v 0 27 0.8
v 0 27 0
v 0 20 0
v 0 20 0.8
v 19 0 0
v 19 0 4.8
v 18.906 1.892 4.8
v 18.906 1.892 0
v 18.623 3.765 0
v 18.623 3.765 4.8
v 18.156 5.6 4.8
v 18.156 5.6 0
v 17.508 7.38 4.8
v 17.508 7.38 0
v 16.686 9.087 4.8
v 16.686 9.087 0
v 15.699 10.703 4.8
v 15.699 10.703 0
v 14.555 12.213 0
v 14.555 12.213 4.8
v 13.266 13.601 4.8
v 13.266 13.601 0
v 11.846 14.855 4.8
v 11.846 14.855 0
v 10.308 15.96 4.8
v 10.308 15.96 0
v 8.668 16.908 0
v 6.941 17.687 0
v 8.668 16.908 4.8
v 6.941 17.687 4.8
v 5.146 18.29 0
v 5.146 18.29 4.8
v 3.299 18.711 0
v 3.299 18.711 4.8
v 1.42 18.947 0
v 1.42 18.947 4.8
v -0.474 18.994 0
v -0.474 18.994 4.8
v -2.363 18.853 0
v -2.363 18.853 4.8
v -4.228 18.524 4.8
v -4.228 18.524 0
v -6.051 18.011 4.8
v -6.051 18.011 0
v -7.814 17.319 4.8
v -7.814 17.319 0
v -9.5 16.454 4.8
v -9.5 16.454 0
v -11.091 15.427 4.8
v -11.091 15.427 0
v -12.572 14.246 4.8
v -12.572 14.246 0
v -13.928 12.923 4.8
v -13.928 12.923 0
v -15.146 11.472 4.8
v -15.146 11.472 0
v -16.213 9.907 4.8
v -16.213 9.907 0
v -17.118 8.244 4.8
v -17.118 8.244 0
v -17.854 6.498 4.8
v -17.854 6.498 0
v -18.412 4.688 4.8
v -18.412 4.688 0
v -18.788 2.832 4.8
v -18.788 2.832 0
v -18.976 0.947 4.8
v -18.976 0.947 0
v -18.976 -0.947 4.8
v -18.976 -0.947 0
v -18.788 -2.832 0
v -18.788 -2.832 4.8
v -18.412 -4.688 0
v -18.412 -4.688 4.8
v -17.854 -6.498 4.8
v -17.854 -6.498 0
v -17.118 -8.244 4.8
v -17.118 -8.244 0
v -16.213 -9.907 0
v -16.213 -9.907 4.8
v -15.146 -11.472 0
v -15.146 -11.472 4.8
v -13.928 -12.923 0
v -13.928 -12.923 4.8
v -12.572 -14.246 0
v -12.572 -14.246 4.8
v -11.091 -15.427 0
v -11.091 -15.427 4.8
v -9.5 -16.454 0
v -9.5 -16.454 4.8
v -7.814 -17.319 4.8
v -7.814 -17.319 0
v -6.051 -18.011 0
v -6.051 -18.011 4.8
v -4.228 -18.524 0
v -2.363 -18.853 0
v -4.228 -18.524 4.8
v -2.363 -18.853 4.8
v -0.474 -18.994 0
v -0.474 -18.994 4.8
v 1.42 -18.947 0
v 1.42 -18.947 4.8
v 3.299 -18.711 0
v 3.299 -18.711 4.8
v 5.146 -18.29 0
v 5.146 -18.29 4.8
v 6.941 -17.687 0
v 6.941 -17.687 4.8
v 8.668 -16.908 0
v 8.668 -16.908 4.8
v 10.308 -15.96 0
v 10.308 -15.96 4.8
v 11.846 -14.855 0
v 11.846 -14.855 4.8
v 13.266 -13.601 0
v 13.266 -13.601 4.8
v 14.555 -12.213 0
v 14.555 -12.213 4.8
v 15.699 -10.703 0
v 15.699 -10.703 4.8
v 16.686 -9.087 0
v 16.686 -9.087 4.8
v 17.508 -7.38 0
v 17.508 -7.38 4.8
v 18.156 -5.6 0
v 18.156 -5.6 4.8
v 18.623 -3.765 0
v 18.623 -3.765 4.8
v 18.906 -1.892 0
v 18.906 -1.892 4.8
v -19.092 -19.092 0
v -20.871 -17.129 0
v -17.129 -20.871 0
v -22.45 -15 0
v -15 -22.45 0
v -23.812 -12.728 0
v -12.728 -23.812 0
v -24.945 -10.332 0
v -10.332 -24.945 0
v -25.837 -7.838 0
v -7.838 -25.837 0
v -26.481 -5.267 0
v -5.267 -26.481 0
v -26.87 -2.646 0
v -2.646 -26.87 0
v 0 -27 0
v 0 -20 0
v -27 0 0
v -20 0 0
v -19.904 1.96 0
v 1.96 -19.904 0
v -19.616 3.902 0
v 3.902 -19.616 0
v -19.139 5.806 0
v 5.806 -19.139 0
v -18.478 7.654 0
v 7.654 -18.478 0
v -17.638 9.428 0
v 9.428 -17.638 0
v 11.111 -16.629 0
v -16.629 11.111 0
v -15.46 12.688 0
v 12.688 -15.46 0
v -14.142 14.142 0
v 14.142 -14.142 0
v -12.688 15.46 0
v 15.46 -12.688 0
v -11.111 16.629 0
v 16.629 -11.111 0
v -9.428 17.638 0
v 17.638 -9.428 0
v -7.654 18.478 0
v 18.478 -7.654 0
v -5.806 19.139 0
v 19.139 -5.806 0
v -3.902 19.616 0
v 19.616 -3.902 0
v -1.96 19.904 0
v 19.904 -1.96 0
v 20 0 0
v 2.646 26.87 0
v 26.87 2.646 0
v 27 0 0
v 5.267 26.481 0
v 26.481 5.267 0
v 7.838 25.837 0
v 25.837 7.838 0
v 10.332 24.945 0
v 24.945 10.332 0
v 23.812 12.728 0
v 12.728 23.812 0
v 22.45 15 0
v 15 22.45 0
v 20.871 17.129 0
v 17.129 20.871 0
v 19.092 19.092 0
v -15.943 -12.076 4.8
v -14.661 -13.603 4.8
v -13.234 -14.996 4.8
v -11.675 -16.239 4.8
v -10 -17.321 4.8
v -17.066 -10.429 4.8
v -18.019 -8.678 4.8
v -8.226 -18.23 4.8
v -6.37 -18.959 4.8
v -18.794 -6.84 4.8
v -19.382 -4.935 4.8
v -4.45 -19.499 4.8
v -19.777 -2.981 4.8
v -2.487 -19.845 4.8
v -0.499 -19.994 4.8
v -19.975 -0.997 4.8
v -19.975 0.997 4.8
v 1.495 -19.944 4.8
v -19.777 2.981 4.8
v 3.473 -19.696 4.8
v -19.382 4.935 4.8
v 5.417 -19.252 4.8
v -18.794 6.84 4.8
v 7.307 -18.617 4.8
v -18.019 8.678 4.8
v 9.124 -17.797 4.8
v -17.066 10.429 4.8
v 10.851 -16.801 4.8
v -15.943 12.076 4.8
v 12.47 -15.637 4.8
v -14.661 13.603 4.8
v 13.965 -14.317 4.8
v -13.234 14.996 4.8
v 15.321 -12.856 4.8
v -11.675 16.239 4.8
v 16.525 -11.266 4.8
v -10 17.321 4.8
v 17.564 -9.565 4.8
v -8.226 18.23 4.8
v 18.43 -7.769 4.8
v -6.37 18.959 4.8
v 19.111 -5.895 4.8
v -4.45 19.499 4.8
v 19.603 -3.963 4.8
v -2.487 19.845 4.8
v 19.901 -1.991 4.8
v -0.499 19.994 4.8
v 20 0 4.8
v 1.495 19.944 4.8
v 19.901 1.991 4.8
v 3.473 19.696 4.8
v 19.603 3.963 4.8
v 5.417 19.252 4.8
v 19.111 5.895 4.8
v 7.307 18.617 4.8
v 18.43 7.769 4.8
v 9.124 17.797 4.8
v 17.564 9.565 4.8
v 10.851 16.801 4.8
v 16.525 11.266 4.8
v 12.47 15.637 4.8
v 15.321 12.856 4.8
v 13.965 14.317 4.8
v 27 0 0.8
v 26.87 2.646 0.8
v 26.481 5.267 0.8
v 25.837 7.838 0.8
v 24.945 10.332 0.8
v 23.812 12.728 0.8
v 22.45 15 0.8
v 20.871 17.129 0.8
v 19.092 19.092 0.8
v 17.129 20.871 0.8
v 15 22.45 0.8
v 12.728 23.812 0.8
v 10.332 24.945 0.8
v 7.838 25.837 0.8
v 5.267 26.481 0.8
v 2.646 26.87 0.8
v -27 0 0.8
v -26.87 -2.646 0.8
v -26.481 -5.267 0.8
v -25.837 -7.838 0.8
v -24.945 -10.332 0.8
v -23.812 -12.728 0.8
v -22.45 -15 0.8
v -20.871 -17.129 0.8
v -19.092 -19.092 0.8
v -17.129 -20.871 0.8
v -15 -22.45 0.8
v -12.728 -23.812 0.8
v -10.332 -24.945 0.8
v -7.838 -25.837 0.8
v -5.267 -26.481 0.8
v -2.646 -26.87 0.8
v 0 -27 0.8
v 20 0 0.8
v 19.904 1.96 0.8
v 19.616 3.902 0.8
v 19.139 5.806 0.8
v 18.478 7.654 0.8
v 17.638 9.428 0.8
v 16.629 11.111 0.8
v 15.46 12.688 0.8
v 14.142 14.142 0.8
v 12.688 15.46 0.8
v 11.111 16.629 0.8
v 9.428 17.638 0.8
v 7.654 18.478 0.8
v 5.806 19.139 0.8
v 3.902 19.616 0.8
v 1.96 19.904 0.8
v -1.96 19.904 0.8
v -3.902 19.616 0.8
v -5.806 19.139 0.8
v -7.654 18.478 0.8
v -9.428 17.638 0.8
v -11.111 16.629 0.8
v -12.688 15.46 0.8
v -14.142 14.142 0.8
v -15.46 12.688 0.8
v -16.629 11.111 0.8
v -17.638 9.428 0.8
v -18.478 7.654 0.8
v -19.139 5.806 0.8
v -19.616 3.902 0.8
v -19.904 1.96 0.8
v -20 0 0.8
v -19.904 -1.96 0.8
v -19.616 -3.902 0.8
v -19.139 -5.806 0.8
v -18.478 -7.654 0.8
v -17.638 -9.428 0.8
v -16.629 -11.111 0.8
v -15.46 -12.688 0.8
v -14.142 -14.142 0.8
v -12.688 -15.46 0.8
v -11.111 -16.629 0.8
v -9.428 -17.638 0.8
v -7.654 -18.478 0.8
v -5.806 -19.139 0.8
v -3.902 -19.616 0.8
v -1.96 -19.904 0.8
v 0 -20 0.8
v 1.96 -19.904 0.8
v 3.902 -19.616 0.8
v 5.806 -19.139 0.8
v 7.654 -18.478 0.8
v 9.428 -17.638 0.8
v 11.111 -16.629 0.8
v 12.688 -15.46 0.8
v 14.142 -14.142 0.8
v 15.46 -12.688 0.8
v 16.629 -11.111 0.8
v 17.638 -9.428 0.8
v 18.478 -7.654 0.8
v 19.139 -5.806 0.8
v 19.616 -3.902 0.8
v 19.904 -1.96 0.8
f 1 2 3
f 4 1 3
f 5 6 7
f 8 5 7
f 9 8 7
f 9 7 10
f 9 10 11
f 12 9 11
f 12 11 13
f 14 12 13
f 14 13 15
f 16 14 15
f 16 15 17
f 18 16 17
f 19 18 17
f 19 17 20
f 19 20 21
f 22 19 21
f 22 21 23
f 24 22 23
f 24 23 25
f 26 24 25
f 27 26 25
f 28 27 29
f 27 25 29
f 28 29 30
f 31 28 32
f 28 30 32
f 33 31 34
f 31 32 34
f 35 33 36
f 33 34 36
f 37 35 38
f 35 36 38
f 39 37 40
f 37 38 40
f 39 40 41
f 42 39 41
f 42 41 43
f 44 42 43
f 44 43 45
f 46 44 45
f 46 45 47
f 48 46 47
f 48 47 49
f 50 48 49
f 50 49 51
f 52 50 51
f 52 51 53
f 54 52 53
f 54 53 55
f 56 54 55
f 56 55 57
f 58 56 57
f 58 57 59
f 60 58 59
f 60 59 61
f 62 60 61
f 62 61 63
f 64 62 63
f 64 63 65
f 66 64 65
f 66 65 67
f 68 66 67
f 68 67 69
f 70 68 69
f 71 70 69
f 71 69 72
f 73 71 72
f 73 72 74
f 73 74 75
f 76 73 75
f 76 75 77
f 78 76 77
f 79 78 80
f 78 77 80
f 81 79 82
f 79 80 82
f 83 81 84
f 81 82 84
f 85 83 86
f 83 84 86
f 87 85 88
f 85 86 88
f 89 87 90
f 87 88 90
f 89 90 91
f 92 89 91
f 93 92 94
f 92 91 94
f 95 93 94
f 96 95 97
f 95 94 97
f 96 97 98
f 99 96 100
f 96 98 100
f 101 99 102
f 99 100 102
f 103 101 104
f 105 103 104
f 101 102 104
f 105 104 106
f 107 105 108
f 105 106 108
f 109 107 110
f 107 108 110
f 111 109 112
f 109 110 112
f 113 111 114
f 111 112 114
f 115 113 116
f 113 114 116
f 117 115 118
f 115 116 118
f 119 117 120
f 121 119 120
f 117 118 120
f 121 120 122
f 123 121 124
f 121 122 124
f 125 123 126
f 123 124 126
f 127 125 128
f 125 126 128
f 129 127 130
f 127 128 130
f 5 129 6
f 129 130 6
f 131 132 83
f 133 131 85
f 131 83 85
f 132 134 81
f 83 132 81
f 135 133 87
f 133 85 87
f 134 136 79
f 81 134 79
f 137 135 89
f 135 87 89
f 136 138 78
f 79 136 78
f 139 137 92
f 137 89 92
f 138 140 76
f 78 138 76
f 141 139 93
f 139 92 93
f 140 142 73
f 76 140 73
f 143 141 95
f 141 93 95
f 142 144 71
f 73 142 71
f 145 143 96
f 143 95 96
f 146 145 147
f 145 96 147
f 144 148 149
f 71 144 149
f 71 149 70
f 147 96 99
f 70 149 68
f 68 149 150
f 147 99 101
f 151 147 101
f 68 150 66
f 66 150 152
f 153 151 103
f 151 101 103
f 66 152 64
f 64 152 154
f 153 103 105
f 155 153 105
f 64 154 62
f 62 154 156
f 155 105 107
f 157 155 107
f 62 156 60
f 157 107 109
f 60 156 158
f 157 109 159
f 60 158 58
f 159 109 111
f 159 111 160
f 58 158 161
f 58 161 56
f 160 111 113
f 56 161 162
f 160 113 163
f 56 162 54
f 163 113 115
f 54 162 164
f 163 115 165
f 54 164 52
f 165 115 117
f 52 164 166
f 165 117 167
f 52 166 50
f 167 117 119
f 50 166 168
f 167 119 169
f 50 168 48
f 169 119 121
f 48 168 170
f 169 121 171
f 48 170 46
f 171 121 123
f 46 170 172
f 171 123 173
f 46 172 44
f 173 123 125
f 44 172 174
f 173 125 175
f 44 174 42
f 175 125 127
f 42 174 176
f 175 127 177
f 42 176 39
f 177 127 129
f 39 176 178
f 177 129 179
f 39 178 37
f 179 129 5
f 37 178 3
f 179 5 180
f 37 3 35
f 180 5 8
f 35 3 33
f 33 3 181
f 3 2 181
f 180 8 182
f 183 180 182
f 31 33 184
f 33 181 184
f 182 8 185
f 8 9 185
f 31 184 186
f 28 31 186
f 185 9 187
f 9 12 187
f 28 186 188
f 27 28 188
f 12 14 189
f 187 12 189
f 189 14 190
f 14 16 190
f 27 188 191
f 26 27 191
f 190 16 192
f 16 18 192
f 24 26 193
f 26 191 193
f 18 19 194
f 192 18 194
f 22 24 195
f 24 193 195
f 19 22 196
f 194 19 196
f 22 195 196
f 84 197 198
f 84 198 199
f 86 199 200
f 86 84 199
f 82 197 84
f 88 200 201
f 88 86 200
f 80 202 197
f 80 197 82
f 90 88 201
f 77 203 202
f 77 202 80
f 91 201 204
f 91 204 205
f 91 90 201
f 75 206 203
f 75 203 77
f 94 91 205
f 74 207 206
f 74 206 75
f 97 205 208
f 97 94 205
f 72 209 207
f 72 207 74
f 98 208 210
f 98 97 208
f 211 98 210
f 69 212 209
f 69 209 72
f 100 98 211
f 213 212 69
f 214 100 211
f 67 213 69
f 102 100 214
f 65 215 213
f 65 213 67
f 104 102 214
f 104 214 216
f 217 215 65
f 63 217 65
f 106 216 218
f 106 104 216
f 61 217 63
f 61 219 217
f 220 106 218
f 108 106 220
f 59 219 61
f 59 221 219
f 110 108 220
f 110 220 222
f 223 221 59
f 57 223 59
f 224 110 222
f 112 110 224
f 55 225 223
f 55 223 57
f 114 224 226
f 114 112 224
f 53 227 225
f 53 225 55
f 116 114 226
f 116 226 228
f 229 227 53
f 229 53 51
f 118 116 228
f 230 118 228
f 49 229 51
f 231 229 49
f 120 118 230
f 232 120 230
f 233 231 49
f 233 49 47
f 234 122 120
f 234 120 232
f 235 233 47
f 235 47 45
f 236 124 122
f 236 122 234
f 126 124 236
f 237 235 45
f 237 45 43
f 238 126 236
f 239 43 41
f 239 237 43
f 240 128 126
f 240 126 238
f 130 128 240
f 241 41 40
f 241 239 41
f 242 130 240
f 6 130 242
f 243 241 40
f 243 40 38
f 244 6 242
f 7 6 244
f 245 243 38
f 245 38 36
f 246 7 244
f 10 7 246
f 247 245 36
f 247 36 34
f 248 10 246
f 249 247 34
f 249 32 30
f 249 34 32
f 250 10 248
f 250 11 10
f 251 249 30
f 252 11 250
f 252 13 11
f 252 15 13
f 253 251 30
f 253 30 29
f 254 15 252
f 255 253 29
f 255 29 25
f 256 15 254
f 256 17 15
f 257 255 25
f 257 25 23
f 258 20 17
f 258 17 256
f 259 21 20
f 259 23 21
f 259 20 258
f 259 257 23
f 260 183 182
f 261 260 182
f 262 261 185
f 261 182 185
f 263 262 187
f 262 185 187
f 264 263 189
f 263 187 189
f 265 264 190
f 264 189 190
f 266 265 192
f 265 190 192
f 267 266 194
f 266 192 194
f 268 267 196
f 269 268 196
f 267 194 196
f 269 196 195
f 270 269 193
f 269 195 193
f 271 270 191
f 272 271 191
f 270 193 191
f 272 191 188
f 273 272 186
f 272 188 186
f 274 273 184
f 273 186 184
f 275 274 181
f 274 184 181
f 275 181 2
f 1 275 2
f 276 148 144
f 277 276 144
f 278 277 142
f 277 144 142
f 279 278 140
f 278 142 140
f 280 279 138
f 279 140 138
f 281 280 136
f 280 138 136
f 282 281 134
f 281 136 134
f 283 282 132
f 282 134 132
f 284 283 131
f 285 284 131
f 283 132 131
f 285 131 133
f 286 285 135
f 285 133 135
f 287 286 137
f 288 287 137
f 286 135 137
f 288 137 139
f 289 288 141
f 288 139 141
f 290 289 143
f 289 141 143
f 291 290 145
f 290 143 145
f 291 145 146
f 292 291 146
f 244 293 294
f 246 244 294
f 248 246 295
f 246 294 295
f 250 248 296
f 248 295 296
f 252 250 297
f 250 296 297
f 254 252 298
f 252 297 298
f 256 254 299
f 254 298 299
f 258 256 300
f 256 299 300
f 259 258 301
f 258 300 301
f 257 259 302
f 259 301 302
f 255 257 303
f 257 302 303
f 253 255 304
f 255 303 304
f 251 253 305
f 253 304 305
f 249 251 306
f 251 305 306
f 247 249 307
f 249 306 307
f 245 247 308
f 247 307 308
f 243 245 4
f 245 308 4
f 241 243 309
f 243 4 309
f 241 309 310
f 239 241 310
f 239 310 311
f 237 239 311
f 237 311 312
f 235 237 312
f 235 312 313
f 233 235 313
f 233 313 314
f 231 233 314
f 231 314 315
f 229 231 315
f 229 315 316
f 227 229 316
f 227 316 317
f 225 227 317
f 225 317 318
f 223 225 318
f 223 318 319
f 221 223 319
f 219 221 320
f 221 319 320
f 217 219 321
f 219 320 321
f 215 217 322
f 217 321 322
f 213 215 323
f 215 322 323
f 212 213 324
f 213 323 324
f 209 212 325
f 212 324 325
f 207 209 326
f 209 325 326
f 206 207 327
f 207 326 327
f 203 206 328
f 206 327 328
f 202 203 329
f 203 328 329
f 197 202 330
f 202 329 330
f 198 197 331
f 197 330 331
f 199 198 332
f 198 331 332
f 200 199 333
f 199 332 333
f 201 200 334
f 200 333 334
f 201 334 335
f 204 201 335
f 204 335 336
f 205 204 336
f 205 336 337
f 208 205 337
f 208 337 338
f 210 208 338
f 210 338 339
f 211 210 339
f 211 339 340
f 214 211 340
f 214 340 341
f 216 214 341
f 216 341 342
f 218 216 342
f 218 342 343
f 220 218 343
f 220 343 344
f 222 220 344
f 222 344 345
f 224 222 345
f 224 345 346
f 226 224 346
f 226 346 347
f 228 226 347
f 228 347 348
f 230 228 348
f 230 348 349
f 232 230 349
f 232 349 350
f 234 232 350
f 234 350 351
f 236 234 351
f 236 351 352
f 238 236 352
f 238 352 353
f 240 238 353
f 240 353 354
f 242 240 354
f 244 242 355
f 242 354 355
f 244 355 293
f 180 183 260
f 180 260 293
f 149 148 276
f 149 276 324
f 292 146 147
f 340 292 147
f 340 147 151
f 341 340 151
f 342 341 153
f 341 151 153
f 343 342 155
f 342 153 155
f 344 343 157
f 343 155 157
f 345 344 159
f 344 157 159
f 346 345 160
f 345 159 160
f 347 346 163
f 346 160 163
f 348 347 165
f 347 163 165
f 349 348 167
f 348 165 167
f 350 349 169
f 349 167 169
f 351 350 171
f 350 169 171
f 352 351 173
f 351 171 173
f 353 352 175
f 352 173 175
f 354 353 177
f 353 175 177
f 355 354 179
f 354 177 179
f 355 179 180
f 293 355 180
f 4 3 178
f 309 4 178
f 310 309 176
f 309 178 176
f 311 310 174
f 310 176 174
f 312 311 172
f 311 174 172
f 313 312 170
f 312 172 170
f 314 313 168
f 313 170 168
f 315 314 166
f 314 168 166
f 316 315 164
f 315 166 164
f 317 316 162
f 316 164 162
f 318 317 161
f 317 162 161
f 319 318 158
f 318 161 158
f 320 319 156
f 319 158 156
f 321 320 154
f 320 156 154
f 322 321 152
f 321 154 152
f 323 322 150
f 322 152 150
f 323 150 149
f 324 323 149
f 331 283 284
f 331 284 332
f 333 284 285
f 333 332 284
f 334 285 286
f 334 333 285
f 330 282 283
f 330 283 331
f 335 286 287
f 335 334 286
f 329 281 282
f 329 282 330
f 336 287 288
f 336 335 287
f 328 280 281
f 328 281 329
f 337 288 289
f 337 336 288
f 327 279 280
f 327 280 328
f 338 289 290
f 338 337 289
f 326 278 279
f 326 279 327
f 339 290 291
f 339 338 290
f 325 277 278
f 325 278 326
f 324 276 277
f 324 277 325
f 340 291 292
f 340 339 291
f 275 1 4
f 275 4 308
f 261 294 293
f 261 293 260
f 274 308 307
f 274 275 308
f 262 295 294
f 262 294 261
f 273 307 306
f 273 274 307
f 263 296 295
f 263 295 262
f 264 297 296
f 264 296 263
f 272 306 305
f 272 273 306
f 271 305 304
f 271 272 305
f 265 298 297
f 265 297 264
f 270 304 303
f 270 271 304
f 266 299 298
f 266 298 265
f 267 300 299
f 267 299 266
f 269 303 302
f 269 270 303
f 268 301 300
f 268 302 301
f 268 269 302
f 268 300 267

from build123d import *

# Parameters (mm, degrees)
PAD_DEPTH    = 0.8
SKETCH001_R  = 20
PAD001_DEPTH = 4
SKETCH002_R  = 19
POCKET_DEPTH = 4.801


with BuildPart() as part:
    # Sketch → Pad (new body)
    with BuildSketch(Plane.XY):
        with BuildLine():
            ThreePointArc((0, 20), (-14.142136, 14.142136), (-20, 0))
            Line((-27, 0), (-20, 0))
            ThreePointArc((-27, 0), (-19.091883, -19.091883), (0, -27))
            Line((0, -27), (0, -20))
            ThreePointArc((0, -20), (14.142136, -14.142136), (20, 0))
            Line((27, 0), (20, 0))
            ThreePointArc((27, 0), (19.091883, 19.091883), (0, 27))
            Line((0, 27), (0, 20))
        make_face()
    extrude(amount=PAD_DEPTH)

    # Sketch001 → Pad001 (new body)
    with BuildSketch(Plane.XY.offset(0.8)):
        Circle(SKETCH001_R)
    extrude(amount=PAD001_DEPTH)

    # Sketch002 → Pocket (cut, through all)
    with BuildSketch(Plane.XY.offset(4.8)):
        Circle(SKETCH002_R)
    extrude(amount=-POCKET_DEPTH, mode=Mode.SUBTRACT)


solid = part.part
